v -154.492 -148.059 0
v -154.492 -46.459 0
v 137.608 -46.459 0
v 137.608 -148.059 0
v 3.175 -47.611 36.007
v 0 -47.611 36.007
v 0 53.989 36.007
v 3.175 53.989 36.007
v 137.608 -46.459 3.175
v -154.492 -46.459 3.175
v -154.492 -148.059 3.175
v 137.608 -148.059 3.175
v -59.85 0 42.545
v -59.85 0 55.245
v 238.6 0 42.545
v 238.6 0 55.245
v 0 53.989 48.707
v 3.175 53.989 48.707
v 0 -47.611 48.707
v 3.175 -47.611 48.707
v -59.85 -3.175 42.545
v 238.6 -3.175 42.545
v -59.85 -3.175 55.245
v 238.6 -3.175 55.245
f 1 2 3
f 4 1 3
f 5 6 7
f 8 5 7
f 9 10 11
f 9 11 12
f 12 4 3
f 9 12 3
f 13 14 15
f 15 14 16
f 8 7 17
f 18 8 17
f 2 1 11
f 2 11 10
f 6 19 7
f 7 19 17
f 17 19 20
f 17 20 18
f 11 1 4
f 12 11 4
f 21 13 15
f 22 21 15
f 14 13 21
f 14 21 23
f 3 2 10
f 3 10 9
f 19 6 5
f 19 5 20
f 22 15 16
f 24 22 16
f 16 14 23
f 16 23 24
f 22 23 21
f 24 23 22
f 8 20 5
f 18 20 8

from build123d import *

# Parameters (mm, degrees)
F0_W     = 292.1
F0_H     = 101.6
F1_DEPTH = 3.175
F2_W     = 298.45
F2_H     = 12.7
F3_DEPTH = 3.175
F4_W     = 101.6
F4_H     = 12.7
F5_DEPTH = 3.175


with BuildPart() as f1:
    # F0 (on Top) → F1 (new body)
    with BuildSketch(Plane.XY):
        with Locations((-8.44177, -97.25921)):
            Rectangle(F0_W, F0_H)
    extrude(amount=F1_DEPTH)


with BuildPart() as f3:
    # F2 (on Front) → F3 (new body)
    with BuildSketch(Plane.XZ):
        with Locations((89.375189, 48.895411)):
            Rectangle(F2_W, F2_H)
    extrude(amount=F3_DEPTH)


with BuildPart() as f5:
    # F4 (on Right) → F5 (new body)
    with BuildSketch(Plane.YZ):
        with Locations((3.188521, 42.357355)):
            Rectangle(F4_W, F4_H)
    extrude(amount=F5_DEPTH)


solid = Compound([f1.part, f3.part, f5.part])
